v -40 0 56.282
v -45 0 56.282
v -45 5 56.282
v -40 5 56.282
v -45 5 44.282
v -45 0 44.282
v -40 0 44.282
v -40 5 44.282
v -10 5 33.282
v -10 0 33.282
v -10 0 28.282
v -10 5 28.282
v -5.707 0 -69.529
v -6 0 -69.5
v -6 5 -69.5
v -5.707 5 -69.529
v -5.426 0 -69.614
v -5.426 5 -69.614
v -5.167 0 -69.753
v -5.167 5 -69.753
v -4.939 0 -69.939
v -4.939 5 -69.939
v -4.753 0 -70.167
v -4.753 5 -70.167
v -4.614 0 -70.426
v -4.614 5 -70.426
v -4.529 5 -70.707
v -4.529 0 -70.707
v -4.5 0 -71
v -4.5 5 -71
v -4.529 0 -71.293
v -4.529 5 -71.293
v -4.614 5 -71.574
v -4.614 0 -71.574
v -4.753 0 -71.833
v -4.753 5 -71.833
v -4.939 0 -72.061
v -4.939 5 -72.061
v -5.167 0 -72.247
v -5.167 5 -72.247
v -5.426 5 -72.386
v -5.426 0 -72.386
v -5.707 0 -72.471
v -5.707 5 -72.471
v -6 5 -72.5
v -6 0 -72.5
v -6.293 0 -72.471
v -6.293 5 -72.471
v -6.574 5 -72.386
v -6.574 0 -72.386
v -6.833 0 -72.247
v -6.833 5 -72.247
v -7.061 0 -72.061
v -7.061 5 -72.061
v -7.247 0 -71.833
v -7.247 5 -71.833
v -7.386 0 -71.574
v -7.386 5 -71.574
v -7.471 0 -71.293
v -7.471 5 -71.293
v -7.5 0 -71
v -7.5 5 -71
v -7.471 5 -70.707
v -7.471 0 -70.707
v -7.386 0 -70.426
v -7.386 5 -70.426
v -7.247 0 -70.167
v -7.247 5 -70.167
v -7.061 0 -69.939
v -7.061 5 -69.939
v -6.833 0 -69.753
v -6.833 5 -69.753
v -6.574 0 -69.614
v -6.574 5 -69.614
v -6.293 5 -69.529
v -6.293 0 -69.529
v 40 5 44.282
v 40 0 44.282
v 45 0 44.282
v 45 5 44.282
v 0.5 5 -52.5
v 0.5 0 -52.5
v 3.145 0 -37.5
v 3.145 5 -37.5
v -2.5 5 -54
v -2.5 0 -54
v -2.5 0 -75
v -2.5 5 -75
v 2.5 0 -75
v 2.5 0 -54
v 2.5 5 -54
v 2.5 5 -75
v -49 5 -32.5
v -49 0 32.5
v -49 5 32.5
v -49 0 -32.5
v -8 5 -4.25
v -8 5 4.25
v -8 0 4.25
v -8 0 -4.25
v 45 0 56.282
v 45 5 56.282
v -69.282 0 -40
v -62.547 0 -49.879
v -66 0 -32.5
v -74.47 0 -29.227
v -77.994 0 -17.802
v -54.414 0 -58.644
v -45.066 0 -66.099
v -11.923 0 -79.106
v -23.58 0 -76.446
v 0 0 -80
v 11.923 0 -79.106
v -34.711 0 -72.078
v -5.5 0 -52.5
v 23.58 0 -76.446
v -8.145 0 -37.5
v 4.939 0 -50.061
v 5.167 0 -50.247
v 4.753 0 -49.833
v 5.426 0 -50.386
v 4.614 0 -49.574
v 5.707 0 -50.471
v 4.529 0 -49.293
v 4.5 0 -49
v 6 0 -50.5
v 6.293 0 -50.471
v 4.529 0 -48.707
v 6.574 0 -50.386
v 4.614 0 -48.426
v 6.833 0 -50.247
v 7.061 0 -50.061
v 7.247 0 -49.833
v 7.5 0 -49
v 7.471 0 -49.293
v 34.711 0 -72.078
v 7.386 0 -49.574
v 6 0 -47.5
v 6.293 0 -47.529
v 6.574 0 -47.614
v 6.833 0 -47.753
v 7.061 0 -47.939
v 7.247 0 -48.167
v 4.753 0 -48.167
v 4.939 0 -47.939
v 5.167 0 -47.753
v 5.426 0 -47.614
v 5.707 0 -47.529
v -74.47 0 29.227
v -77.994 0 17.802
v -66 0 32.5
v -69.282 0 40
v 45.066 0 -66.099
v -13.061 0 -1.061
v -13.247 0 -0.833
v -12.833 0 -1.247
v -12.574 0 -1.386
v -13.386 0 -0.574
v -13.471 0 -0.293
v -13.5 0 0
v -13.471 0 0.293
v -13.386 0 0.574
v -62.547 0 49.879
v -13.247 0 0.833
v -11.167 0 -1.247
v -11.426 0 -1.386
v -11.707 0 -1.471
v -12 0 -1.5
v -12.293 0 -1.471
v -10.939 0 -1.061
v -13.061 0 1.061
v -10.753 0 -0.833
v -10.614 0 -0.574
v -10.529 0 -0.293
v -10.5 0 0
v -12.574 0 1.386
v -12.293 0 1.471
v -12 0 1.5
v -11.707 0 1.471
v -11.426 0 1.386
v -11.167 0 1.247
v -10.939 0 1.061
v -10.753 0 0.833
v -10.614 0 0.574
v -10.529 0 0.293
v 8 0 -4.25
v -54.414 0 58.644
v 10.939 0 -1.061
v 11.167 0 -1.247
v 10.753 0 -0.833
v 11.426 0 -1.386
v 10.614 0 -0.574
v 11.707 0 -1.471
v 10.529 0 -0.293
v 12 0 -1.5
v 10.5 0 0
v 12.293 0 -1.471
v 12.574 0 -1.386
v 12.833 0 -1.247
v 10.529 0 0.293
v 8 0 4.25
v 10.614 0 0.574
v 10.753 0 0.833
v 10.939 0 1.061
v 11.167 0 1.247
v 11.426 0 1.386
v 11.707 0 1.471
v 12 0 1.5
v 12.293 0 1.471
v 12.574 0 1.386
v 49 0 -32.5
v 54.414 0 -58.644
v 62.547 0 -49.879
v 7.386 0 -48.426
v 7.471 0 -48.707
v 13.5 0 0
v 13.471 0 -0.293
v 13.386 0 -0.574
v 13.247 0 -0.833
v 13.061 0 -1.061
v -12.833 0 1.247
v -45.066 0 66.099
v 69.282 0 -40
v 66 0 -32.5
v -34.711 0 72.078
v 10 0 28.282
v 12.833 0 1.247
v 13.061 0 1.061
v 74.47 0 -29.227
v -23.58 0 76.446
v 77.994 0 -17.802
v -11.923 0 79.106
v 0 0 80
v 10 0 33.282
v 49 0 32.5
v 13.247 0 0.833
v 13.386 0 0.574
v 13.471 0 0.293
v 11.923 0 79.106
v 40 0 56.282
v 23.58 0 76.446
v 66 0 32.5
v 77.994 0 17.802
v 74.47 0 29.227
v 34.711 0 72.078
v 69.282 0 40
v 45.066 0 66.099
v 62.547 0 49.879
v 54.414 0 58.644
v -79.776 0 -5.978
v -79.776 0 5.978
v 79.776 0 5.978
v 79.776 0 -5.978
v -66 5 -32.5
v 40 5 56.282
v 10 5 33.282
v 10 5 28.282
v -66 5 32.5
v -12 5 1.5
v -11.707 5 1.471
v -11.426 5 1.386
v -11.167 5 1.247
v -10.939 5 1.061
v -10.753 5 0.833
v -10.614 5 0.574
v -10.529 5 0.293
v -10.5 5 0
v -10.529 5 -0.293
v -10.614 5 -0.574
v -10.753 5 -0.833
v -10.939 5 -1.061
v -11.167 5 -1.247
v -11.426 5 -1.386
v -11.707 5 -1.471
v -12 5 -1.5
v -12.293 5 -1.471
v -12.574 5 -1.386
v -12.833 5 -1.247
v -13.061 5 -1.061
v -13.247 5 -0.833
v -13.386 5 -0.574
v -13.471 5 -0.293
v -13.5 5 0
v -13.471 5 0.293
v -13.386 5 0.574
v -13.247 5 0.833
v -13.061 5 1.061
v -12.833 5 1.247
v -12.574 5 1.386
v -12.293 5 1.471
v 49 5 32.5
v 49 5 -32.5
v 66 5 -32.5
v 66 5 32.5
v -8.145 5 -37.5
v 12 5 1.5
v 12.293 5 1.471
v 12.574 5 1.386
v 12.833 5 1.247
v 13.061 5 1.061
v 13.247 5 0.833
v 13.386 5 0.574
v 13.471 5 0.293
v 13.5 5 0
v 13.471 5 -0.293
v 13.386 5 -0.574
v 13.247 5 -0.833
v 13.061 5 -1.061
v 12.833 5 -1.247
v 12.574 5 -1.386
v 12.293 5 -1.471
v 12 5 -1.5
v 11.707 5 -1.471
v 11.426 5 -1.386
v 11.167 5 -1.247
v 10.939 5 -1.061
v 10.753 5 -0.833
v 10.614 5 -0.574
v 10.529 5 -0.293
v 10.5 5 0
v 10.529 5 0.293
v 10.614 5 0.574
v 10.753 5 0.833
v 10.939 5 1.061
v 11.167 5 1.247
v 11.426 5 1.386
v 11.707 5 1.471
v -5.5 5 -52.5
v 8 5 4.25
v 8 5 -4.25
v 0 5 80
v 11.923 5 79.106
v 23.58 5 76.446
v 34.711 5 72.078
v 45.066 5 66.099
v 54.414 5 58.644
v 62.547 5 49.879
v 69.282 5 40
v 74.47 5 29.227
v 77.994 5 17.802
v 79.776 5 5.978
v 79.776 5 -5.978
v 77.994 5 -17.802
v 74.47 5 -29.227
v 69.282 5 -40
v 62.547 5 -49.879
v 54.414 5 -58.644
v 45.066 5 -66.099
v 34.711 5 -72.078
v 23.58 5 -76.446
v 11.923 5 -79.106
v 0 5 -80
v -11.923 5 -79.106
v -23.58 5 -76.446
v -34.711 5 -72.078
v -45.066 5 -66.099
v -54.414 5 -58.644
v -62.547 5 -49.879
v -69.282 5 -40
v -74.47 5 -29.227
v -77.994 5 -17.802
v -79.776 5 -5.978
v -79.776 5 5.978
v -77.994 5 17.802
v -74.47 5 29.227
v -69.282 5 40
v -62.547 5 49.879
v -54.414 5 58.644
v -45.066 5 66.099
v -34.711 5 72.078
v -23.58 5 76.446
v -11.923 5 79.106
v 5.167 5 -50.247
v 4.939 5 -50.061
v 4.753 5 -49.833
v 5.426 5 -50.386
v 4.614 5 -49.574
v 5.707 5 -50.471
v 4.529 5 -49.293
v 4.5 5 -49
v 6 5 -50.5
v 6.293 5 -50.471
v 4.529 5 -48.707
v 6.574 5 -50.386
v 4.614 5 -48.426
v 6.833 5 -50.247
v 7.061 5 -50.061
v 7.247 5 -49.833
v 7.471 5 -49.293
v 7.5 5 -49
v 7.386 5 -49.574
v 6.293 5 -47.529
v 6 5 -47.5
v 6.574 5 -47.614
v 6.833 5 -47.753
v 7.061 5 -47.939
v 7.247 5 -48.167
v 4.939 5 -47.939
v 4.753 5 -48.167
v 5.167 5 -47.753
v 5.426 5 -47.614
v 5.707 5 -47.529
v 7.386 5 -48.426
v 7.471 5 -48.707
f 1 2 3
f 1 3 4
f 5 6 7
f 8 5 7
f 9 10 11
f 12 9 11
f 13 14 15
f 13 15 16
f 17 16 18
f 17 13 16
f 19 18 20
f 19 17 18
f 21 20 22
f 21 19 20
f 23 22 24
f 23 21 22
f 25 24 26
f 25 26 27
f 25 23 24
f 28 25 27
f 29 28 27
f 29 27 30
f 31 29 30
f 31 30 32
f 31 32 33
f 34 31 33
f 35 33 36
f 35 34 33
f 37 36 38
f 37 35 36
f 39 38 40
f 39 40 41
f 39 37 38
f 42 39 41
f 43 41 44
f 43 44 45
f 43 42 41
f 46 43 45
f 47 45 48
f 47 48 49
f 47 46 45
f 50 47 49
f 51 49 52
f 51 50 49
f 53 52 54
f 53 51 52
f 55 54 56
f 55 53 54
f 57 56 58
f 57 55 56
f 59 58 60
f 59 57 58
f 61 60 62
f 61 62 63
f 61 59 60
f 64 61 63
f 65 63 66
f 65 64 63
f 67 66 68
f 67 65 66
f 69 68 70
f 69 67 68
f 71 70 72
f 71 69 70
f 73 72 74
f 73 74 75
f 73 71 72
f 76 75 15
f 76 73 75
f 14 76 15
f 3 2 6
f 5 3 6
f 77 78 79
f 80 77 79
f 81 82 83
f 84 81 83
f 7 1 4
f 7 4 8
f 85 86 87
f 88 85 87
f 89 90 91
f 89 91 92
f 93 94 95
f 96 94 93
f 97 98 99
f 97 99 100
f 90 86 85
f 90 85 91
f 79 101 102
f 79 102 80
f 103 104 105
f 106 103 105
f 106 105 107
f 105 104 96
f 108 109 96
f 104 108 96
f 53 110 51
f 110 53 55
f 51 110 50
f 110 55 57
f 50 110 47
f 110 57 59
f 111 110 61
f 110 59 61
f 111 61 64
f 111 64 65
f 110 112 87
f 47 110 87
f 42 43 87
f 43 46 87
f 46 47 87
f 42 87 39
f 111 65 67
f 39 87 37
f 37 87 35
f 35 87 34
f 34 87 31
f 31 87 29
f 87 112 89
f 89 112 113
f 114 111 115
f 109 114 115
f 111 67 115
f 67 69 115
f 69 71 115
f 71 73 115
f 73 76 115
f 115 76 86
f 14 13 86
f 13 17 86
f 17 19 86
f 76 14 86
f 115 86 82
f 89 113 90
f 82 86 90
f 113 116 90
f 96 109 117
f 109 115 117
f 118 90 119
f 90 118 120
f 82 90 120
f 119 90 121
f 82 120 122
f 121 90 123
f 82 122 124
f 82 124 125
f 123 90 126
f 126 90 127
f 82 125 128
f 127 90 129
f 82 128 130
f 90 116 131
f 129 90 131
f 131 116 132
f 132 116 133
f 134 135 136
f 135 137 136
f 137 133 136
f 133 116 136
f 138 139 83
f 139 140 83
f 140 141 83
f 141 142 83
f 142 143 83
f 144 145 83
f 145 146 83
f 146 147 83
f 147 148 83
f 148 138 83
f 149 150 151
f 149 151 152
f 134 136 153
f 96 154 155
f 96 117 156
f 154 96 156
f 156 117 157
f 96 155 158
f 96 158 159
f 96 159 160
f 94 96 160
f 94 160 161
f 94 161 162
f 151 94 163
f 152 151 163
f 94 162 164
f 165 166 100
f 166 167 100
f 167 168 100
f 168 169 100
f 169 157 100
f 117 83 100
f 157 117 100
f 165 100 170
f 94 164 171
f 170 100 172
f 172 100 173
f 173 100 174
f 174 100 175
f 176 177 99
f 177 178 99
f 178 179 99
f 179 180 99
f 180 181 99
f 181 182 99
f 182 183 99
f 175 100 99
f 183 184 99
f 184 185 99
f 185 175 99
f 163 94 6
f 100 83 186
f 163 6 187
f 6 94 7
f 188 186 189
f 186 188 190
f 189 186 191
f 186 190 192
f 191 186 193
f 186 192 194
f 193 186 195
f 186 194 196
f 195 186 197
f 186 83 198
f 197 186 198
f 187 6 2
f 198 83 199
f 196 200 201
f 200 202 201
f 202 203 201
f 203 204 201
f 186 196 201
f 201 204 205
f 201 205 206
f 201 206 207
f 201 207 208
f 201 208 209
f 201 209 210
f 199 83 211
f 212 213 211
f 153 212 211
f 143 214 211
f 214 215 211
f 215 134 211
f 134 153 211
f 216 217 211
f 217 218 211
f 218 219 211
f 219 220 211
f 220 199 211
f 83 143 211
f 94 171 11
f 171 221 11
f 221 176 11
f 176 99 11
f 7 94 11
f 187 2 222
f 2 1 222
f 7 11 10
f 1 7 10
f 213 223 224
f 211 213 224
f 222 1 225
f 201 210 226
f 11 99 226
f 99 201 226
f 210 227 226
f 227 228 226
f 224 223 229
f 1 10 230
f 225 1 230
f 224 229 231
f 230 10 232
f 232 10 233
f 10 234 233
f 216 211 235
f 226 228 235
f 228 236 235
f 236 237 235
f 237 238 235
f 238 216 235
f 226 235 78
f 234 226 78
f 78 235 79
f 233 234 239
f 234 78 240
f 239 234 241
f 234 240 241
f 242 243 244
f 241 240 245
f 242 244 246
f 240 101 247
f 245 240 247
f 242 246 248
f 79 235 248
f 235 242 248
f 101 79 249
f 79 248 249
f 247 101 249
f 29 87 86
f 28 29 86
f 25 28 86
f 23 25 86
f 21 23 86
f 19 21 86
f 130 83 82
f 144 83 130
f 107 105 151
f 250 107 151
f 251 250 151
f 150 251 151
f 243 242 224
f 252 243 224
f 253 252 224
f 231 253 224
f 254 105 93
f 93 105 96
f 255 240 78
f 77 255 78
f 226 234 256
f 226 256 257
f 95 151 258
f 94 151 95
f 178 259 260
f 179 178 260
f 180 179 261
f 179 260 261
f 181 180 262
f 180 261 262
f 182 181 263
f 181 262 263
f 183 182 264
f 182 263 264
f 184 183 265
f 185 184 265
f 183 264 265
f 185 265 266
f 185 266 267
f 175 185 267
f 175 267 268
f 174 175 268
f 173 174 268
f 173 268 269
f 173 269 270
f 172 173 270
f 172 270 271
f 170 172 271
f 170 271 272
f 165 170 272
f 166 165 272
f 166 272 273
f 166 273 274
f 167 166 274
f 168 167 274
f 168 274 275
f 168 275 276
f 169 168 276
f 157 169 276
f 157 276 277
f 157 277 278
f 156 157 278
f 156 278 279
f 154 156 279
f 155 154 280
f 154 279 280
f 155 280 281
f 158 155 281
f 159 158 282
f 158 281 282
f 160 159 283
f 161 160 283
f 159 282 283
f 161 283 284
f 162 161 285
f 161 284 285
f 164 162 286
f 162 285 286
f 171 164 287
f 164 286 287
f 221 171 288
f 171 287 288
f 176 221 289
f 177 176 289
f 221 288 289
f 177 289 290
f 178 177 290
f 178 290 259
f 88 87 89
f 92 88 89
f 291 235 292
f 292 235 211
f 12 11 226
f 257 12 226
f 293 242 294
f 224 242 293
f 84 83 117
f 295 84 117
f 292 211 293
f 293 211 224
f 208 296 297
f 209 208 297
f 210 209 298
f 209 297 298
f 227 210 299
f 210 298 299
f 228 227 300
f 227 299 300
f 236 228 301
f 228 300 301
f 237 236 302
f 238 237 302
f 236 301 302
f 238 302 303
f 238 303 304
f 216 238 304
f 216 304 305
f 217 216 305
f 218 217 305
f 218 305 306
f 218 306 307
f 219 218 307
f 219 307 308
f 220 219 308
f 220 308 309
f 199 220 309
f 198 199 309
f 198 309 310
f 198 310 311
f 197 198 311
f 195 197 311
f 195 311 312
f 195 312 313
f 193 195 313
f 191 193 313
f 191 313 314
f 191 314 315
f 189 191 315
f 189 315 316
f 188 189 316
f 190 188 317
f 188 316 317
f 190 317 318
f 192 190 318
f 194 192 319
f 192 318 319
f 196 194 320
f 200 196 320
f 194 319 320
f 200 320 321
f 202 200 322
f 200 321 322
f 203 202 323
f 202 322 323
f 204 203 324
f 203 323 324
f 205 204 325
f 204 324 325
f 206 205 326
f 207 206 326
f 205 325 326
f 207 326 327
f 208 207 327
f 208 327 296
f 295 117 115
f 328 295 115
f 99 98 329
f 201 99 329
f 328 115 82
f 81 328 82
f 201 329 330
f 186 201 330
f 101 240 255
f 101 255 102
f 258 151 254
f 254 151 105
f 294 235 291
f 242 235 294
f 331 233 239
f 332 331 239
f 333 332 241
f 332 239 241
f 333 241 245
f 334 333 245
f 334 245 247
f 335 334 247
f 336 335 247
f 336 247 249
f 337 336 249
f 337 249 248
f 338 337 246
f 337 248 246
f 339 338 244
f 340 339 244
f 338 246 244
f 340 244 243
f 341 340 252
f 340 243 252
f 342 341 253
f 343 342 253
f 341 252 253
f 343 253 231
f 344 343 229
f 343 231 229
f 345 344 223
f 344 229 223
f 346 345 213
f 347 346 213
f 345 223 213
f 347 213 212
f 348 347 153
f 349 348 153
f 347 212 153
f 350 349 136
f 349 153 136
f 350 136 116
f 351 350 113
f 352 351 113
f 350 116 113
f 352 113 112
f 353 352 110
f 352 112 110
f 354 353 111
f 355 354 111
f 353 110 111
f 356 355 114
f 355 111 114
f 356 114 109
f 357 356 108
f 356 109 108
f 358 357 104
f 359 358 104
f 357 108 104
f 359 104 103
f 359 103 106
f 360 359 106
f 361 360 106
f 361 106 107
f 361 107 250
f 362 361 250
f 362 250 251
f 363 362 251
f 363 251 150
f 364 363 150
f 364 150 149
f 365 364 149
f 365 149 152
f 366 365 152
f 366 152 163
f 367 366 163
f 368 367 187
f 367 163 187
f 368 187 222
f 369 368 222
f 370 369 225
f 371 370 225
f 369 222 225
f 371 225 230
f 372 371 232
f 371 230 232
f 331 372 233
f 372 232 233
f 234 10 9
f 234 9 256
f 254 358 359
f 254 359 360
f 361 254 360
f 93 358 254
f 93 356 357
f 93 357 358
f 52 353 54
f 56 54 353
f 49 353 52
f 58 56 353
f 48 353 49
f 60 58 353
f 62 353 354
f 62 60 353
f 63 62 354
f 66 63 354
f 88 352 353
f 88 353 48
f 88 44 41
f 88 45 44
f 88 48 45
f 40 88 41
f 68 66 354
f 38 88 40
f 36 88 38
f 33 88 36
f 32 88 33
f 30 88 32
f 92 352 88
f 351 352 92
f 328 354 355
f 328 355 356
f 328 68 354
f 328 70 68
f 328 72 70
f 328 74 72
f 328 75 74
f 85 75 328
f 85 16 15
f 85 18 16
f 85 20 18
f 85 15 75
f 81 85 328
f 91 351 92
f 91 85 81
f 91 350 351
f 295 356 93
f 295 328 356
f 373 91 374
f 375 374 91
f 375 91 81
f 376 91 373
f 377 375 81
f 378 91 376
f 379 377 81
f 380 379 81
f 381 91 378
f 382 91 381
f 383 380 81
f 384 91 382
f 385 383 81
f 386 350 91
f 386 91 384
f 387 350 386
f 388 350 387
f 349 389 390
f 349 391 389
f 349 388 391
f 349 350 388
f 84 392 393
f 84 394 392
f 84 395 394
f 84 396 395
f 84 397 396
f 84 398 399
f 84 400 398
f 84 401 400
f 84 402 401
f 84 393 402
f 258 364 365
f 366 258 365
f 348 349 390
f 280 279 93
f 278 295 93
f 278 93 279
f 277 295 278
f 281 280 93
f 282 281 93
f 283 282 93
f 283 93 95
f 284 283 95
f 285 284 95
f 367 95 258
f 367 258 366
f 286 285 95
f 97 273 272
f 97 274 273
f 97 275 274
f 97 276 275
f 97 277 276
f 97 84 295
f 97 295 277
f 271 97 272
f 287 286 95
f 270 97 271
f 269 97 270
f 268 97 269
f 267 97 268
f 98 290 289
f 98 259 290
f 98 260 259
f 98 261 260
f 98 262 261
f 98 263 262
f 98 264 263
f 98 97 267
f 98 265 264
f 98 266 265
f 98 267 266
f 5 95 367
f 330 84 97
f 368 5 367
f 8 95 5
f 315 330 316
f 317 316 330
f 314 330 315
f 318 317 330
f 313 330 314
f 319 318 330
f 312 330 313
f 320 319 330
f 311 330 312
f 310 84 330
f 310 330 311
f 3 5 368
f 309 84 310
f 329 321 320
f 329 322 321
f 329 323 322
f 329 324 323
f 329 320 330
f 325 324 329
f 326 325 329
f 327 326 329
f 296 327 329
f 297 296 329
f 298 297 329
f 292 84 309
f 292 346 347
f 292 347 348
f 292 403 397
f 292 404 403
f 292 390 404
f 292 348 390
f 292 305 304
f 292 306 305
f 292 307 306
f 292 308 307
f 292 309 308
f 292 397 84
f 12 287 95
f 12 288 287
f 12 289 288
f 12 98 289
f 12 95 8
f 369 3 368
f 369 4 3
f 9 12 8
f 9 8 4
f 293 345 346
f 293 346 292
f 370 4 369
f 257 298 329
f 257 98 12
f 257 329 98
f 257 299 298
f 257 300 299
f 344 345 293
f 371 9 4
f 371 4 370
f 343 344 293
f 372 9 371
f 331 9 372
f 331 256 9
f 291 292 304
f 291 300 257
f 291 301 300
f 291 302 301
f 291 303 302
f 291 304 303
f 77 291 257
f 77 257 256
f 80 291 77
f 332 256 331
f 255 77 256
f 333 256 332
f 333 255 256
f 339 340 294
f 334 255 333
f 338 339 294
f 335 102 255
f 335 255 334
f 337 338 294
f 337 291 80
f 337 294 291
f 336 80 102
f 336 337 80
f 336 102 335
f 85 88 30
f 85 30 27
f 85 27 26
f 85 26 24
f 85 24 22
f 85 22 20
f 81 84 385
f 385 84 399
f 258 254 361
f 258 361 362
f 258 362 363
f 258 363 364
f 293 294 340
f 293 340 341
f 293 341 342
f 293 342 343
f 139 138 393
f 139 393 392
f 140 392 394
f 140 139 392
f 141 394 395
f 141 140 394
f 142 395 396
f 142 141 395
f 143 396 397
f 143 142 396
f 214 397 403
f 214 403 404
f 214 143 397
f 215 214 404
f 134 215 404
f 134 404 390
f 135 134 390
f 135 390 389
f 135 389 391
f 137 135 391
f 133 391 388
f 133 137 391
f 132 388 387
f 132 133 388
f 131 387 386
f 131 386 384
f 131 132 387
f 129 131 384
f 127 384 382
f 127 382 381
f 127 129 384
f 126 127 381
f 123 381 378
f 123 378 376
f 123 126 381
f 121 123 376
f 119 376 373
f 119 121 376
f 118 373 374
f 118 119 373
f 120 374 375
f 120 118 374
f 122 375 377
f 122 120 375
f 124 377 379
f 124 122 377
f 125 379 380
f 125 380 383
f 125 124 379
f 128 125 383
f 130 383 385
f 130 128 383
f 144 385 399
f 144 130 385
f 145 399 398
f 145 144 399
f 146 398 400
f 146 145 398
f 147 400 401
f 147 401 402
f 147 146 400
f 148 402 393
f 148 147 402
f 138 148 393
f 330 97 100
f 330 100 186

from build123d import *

# Parameters (mm, degrees)
SKETCH1_R           = 80
SKETCH1_R_2         = 1.5
SKETCH1_W           = 17
SKETCH1_H           = 65
SKETCH1_W_2         = 5
SKETCH1_H_2         = 21
SKETCH1_H_3         = 12
SKETCH1_W_3         = 20
SKETCH1_H_4         = 5
BOSS_EXTRUDE1_DEPTH = 5
SKETCH2_R           = 1.5
SKETCH2_W           = 16
SKETCH2_H           = 8.5
SAFETY_LINK_DEPTH   = 10


with BuildPart() as part:
    # Sketch1 → Boss-Extrude1 (new body)
    with BuildSketch(Plane(origin=(0, 0, 0), x_dir=(1, 0, 0), z_dir=(0, 1, 0))):
        with Locations(Location((0, 0, 0), (0, 0, 270))):
            Circle(SKETCH1_R)
        with Locations(Location((-6, 71, 0), (0, 0, 270))):
            Circle(SKETCH1_R_2, mode=Mode.SUBTRACT)
        with Locations(Location((6, 49, 0), (0, 0, 270))):
            Circle(SKETCH1_R_2, mode=Mode.SUBTRACT)
        with Locations((-57.5, 0)):
            Rectangle(SKETCH1_W, SKETCH1_H, mode=Mode.SUBTRACT)
        with Locations((57.5, 0)):
            Rectangle(SKETCH1_W, SKETCH1_H, mode=Mode.SUBTRACT)
        with Locations((0, 64.5)):
            Rectangle(SKETCH1_W_2, SKETCH1_H_2, mode=Mode.SUBTRACT)
        Polygon((-5.5, 52.5), (0.5, 52.5), (3.144904711, 37.5), (-8.144904711, 37.5), align=None, mode=Mode.SUBTRACT)
        with Locations((42.5, -50.282032303)):
            Rectangle(SKETCH1_W_2, SKETCH1_H_3, mode=Mode.SUBTRACT)
        with Locations((-42.5, -50.282032303)):
            Rectangle(SKETCH1_W_2, SKETCH1_H_3, mode=Mode.SUBTRACT)
        with Locations((0, -30.782032303)):
            Rectangle(SKETCH1_W_3, SKETCH1_H_4, mode=Mode.SUBTRACT)
    extrude(amount=BOSS_EXTRUDE1_DEPTH)

    # Sketch2 → safety_link (cut)
    with BuildSketch(Plane(origin=(0, 5, 0), x_dir=(1, 0, 0), z_dir=(0, 1, 0))):
        with Locations(Location((-12, 0, 0), (0, 0, 270))):
            Circle(SKETCH2_R)
        with Locations(Location((12, 0, 0), (0, 0, 270))):
            Circle(SKETCH2_R)
        Rectangle(SKETCH2_W, SKETCH2_H)
    extrude(amount=-SAFETY_LINK_DEPTH, mode=Mode.SUBTRACT)


solid = part.part
